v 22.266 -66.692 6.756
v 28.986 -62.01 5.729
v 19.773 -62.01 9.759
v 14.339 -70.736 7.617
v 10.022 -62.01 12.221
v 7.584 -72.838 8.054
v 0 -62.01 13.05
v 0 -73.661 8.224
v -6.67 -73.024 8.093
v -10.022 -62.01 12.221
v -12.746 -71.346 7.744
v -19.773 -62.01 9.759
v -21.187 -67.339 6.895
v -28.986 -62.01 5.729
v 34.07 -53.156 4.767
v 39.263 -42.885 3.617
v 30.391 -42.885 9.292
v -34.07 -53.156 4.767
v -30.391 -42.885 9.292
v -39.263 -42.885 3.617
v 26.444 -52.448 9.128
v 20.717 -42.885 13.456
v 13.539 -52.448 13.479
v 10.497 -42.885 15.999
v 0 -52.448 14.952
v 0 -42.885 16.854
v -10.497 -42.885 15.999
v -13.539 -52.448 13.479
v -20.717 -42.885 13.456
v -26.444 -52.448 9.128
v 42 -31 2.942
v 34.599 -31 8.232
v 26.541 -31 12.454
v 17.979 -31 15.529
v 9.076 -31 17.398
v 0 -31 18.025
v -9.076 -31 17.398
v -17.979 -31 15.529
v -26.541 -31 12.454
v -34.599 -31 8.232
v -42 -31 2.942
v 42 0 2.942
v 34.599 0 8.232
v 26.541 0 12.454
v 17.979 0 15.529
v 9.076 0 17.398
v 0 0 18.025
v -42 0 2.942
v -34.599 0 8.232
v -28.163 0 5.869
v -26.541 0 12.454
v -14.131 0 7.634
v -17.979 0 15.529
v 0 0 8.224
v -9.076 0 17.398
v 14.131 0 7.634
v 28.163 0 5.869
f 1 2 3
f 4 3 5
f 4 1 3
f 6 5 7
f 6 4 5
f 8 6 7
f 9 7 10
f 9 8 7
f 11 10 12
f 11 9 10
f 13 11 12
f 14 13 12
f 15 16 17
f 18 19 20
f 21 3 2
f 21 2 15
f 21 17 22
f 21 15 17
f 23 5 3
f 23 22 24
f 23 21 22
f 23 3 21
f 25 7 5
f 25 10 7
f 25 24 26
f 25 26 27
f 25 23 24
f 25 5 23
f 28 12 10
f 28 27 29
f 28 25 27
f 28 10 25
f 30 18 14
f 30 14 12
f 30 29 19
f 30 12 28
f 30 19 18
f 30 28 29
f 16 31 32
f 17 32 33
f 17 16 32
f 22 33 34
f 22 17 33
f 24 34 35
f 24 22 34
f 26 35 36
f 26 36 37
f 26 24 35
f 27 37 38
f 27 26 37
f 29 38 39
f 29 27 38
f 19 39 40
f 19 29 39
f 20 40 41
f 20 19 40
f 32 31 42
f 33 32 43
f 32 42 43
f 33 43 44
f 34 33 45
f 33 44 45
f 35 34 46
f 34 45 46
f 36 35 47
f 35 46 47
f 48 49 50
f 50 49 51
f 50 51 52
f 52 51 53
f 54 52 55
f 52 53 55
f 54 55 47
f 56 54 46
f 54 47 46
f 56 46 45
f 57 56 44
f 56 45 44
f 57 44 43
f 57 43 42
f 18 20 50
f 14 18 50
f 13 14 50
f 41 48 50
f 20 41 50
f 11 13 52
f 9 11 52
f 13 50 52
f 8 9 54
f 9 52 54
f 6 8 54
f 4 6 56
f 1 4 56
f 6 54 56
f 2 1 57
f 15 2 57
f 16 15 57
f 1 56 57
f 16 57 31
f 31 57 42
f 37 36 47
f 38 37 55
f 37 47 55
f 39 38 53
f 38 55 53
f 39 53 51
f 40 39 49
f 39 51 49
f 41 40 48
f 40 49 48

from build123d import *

# Parameters (mm, degrees)
F1_DEPTH    = 75
F2_T2_ANGLE = 123.6693885688
F3_T2_ANGLE = 146.542163671
F4_T2_ANGLE = 137.6625417494
F5_T2_ANGLE = 106.0986339536


# Not quite as in the source:
# - a fillet or chamfer that OpenCascade refuses, or shapes differently, is made with other operations: its cross-section is extruded or revolved along the edge and cut away or added


with BuildPart() as f1:
    # F0 (on Front) → F1 (new body)
    with BuildSketch(Plane.XZ):
        with BuildLine():
            Line((0, 18.0245880038), (0, 8.2237206428))
            ThreePointArc((0, 8.2237206428), (21.1654297157, 6.8979891087), (42, 2.9415184316))
            ThreePointArc((42, 2.9415184316), (22.3131070658, 14.1395036835), (0, 18.0245880038))
        make_face()
        with BuildLine():
            ThreePointArc((-42, 2.9415184316), (-21.1654297157, 6.8979891087), (0, 8.2237206428))
            Line((0, 8.2237206428), (0, 18.0245880038))
            ThreePointArc((0, 18.0245880038), (-22.3131070658, 14.1395036835), (-42, 2.9415184316))
        make_face()
    extrude(amount=F1_DEPTH)

    # F2: chamfer of 10 on 1 edges, made by hand

    # F2_s1 → F2_t2 (revolve, cut)
    with BuildSketch(Plane(origin=(19.9711424115, 0, -37.3002397662), x_dir=(0, 1, 0), z_dir=(0.472017023, 0, -0.8815894339))):
        Polygon((-65, 43.3641317608), (-75, 33.3641317608), (-75, 43.3641317608), align=None)
    revolve(axis=Axis((0, -75, -47.9931074722), (0, -1, 0)), revolution_arc=F2_T2_ANGLE, mode=Mode.SUBTRACT)

    # F3: chamfer of 15 on 1 edges, made by hand

    # F3_s1 → F3_t2 (revolve, cut)
    with BuildSketch(Plane(origin=(13.2298564014, 0, -44.0166808787), x_dir=(0, 1, 0), z_dir=(0.2878439127, 0, -0.9576773371))):
        Polygon((-50, 52.2031716385), (-75.6066017178, 41.5965699207), (-65, 52.2031716385), align=None)
    revolve(axis=Axis((0, -65, -47.9931074722), (0, -1, 0)), revolution_arc=F3_T2_ANGLE, mode=Mode.SUBTRACT)

    # F4: chamfer of 13 on 1 edges, made by hand

    # F4_s1 → F4_t2 (revolve, cut)
    with BuildSketch(Plane(origin=(16.1615809903, 0, -41.7345888895), x_dir=(0, 1, 0), z_dir=(0.3611156728, 0, -0.9325210297))):
        Polygon((-37, 48.6866321803), (-62.0104339226, 43.7117475596), (-50, 48.6866321803), align=None)
    revolve(axis=Axis((0, -50, -47.9931074722), (0, -1, 0)), revolution_arc=F4_T2_ANGLE, mode=Mode.SUBTRACT)

    # F5: chamfer of 6 on 1 edges, made by hand

    # F5_s1 → F5_t2 (revolve, cut)
    with BuildSketch(Plane(origin=(23.0555472536, 0, -30.6506000272), x_dir=(0, 1, 0), z_dir=(0.6011273799, 0, -0.7991532226))):
        Polygon((-31, 37.1677245289), (-42.8847116824, 35.9971825968), (-37, 37.1677245289), align=None)
    revolve(axis=Axis((0, -37, -47.9931074722), (0, -1, 0)), revolution_arc=F5_T2_ANGLE, mode=Mode.SUBTRACT)


solid = f1.part
